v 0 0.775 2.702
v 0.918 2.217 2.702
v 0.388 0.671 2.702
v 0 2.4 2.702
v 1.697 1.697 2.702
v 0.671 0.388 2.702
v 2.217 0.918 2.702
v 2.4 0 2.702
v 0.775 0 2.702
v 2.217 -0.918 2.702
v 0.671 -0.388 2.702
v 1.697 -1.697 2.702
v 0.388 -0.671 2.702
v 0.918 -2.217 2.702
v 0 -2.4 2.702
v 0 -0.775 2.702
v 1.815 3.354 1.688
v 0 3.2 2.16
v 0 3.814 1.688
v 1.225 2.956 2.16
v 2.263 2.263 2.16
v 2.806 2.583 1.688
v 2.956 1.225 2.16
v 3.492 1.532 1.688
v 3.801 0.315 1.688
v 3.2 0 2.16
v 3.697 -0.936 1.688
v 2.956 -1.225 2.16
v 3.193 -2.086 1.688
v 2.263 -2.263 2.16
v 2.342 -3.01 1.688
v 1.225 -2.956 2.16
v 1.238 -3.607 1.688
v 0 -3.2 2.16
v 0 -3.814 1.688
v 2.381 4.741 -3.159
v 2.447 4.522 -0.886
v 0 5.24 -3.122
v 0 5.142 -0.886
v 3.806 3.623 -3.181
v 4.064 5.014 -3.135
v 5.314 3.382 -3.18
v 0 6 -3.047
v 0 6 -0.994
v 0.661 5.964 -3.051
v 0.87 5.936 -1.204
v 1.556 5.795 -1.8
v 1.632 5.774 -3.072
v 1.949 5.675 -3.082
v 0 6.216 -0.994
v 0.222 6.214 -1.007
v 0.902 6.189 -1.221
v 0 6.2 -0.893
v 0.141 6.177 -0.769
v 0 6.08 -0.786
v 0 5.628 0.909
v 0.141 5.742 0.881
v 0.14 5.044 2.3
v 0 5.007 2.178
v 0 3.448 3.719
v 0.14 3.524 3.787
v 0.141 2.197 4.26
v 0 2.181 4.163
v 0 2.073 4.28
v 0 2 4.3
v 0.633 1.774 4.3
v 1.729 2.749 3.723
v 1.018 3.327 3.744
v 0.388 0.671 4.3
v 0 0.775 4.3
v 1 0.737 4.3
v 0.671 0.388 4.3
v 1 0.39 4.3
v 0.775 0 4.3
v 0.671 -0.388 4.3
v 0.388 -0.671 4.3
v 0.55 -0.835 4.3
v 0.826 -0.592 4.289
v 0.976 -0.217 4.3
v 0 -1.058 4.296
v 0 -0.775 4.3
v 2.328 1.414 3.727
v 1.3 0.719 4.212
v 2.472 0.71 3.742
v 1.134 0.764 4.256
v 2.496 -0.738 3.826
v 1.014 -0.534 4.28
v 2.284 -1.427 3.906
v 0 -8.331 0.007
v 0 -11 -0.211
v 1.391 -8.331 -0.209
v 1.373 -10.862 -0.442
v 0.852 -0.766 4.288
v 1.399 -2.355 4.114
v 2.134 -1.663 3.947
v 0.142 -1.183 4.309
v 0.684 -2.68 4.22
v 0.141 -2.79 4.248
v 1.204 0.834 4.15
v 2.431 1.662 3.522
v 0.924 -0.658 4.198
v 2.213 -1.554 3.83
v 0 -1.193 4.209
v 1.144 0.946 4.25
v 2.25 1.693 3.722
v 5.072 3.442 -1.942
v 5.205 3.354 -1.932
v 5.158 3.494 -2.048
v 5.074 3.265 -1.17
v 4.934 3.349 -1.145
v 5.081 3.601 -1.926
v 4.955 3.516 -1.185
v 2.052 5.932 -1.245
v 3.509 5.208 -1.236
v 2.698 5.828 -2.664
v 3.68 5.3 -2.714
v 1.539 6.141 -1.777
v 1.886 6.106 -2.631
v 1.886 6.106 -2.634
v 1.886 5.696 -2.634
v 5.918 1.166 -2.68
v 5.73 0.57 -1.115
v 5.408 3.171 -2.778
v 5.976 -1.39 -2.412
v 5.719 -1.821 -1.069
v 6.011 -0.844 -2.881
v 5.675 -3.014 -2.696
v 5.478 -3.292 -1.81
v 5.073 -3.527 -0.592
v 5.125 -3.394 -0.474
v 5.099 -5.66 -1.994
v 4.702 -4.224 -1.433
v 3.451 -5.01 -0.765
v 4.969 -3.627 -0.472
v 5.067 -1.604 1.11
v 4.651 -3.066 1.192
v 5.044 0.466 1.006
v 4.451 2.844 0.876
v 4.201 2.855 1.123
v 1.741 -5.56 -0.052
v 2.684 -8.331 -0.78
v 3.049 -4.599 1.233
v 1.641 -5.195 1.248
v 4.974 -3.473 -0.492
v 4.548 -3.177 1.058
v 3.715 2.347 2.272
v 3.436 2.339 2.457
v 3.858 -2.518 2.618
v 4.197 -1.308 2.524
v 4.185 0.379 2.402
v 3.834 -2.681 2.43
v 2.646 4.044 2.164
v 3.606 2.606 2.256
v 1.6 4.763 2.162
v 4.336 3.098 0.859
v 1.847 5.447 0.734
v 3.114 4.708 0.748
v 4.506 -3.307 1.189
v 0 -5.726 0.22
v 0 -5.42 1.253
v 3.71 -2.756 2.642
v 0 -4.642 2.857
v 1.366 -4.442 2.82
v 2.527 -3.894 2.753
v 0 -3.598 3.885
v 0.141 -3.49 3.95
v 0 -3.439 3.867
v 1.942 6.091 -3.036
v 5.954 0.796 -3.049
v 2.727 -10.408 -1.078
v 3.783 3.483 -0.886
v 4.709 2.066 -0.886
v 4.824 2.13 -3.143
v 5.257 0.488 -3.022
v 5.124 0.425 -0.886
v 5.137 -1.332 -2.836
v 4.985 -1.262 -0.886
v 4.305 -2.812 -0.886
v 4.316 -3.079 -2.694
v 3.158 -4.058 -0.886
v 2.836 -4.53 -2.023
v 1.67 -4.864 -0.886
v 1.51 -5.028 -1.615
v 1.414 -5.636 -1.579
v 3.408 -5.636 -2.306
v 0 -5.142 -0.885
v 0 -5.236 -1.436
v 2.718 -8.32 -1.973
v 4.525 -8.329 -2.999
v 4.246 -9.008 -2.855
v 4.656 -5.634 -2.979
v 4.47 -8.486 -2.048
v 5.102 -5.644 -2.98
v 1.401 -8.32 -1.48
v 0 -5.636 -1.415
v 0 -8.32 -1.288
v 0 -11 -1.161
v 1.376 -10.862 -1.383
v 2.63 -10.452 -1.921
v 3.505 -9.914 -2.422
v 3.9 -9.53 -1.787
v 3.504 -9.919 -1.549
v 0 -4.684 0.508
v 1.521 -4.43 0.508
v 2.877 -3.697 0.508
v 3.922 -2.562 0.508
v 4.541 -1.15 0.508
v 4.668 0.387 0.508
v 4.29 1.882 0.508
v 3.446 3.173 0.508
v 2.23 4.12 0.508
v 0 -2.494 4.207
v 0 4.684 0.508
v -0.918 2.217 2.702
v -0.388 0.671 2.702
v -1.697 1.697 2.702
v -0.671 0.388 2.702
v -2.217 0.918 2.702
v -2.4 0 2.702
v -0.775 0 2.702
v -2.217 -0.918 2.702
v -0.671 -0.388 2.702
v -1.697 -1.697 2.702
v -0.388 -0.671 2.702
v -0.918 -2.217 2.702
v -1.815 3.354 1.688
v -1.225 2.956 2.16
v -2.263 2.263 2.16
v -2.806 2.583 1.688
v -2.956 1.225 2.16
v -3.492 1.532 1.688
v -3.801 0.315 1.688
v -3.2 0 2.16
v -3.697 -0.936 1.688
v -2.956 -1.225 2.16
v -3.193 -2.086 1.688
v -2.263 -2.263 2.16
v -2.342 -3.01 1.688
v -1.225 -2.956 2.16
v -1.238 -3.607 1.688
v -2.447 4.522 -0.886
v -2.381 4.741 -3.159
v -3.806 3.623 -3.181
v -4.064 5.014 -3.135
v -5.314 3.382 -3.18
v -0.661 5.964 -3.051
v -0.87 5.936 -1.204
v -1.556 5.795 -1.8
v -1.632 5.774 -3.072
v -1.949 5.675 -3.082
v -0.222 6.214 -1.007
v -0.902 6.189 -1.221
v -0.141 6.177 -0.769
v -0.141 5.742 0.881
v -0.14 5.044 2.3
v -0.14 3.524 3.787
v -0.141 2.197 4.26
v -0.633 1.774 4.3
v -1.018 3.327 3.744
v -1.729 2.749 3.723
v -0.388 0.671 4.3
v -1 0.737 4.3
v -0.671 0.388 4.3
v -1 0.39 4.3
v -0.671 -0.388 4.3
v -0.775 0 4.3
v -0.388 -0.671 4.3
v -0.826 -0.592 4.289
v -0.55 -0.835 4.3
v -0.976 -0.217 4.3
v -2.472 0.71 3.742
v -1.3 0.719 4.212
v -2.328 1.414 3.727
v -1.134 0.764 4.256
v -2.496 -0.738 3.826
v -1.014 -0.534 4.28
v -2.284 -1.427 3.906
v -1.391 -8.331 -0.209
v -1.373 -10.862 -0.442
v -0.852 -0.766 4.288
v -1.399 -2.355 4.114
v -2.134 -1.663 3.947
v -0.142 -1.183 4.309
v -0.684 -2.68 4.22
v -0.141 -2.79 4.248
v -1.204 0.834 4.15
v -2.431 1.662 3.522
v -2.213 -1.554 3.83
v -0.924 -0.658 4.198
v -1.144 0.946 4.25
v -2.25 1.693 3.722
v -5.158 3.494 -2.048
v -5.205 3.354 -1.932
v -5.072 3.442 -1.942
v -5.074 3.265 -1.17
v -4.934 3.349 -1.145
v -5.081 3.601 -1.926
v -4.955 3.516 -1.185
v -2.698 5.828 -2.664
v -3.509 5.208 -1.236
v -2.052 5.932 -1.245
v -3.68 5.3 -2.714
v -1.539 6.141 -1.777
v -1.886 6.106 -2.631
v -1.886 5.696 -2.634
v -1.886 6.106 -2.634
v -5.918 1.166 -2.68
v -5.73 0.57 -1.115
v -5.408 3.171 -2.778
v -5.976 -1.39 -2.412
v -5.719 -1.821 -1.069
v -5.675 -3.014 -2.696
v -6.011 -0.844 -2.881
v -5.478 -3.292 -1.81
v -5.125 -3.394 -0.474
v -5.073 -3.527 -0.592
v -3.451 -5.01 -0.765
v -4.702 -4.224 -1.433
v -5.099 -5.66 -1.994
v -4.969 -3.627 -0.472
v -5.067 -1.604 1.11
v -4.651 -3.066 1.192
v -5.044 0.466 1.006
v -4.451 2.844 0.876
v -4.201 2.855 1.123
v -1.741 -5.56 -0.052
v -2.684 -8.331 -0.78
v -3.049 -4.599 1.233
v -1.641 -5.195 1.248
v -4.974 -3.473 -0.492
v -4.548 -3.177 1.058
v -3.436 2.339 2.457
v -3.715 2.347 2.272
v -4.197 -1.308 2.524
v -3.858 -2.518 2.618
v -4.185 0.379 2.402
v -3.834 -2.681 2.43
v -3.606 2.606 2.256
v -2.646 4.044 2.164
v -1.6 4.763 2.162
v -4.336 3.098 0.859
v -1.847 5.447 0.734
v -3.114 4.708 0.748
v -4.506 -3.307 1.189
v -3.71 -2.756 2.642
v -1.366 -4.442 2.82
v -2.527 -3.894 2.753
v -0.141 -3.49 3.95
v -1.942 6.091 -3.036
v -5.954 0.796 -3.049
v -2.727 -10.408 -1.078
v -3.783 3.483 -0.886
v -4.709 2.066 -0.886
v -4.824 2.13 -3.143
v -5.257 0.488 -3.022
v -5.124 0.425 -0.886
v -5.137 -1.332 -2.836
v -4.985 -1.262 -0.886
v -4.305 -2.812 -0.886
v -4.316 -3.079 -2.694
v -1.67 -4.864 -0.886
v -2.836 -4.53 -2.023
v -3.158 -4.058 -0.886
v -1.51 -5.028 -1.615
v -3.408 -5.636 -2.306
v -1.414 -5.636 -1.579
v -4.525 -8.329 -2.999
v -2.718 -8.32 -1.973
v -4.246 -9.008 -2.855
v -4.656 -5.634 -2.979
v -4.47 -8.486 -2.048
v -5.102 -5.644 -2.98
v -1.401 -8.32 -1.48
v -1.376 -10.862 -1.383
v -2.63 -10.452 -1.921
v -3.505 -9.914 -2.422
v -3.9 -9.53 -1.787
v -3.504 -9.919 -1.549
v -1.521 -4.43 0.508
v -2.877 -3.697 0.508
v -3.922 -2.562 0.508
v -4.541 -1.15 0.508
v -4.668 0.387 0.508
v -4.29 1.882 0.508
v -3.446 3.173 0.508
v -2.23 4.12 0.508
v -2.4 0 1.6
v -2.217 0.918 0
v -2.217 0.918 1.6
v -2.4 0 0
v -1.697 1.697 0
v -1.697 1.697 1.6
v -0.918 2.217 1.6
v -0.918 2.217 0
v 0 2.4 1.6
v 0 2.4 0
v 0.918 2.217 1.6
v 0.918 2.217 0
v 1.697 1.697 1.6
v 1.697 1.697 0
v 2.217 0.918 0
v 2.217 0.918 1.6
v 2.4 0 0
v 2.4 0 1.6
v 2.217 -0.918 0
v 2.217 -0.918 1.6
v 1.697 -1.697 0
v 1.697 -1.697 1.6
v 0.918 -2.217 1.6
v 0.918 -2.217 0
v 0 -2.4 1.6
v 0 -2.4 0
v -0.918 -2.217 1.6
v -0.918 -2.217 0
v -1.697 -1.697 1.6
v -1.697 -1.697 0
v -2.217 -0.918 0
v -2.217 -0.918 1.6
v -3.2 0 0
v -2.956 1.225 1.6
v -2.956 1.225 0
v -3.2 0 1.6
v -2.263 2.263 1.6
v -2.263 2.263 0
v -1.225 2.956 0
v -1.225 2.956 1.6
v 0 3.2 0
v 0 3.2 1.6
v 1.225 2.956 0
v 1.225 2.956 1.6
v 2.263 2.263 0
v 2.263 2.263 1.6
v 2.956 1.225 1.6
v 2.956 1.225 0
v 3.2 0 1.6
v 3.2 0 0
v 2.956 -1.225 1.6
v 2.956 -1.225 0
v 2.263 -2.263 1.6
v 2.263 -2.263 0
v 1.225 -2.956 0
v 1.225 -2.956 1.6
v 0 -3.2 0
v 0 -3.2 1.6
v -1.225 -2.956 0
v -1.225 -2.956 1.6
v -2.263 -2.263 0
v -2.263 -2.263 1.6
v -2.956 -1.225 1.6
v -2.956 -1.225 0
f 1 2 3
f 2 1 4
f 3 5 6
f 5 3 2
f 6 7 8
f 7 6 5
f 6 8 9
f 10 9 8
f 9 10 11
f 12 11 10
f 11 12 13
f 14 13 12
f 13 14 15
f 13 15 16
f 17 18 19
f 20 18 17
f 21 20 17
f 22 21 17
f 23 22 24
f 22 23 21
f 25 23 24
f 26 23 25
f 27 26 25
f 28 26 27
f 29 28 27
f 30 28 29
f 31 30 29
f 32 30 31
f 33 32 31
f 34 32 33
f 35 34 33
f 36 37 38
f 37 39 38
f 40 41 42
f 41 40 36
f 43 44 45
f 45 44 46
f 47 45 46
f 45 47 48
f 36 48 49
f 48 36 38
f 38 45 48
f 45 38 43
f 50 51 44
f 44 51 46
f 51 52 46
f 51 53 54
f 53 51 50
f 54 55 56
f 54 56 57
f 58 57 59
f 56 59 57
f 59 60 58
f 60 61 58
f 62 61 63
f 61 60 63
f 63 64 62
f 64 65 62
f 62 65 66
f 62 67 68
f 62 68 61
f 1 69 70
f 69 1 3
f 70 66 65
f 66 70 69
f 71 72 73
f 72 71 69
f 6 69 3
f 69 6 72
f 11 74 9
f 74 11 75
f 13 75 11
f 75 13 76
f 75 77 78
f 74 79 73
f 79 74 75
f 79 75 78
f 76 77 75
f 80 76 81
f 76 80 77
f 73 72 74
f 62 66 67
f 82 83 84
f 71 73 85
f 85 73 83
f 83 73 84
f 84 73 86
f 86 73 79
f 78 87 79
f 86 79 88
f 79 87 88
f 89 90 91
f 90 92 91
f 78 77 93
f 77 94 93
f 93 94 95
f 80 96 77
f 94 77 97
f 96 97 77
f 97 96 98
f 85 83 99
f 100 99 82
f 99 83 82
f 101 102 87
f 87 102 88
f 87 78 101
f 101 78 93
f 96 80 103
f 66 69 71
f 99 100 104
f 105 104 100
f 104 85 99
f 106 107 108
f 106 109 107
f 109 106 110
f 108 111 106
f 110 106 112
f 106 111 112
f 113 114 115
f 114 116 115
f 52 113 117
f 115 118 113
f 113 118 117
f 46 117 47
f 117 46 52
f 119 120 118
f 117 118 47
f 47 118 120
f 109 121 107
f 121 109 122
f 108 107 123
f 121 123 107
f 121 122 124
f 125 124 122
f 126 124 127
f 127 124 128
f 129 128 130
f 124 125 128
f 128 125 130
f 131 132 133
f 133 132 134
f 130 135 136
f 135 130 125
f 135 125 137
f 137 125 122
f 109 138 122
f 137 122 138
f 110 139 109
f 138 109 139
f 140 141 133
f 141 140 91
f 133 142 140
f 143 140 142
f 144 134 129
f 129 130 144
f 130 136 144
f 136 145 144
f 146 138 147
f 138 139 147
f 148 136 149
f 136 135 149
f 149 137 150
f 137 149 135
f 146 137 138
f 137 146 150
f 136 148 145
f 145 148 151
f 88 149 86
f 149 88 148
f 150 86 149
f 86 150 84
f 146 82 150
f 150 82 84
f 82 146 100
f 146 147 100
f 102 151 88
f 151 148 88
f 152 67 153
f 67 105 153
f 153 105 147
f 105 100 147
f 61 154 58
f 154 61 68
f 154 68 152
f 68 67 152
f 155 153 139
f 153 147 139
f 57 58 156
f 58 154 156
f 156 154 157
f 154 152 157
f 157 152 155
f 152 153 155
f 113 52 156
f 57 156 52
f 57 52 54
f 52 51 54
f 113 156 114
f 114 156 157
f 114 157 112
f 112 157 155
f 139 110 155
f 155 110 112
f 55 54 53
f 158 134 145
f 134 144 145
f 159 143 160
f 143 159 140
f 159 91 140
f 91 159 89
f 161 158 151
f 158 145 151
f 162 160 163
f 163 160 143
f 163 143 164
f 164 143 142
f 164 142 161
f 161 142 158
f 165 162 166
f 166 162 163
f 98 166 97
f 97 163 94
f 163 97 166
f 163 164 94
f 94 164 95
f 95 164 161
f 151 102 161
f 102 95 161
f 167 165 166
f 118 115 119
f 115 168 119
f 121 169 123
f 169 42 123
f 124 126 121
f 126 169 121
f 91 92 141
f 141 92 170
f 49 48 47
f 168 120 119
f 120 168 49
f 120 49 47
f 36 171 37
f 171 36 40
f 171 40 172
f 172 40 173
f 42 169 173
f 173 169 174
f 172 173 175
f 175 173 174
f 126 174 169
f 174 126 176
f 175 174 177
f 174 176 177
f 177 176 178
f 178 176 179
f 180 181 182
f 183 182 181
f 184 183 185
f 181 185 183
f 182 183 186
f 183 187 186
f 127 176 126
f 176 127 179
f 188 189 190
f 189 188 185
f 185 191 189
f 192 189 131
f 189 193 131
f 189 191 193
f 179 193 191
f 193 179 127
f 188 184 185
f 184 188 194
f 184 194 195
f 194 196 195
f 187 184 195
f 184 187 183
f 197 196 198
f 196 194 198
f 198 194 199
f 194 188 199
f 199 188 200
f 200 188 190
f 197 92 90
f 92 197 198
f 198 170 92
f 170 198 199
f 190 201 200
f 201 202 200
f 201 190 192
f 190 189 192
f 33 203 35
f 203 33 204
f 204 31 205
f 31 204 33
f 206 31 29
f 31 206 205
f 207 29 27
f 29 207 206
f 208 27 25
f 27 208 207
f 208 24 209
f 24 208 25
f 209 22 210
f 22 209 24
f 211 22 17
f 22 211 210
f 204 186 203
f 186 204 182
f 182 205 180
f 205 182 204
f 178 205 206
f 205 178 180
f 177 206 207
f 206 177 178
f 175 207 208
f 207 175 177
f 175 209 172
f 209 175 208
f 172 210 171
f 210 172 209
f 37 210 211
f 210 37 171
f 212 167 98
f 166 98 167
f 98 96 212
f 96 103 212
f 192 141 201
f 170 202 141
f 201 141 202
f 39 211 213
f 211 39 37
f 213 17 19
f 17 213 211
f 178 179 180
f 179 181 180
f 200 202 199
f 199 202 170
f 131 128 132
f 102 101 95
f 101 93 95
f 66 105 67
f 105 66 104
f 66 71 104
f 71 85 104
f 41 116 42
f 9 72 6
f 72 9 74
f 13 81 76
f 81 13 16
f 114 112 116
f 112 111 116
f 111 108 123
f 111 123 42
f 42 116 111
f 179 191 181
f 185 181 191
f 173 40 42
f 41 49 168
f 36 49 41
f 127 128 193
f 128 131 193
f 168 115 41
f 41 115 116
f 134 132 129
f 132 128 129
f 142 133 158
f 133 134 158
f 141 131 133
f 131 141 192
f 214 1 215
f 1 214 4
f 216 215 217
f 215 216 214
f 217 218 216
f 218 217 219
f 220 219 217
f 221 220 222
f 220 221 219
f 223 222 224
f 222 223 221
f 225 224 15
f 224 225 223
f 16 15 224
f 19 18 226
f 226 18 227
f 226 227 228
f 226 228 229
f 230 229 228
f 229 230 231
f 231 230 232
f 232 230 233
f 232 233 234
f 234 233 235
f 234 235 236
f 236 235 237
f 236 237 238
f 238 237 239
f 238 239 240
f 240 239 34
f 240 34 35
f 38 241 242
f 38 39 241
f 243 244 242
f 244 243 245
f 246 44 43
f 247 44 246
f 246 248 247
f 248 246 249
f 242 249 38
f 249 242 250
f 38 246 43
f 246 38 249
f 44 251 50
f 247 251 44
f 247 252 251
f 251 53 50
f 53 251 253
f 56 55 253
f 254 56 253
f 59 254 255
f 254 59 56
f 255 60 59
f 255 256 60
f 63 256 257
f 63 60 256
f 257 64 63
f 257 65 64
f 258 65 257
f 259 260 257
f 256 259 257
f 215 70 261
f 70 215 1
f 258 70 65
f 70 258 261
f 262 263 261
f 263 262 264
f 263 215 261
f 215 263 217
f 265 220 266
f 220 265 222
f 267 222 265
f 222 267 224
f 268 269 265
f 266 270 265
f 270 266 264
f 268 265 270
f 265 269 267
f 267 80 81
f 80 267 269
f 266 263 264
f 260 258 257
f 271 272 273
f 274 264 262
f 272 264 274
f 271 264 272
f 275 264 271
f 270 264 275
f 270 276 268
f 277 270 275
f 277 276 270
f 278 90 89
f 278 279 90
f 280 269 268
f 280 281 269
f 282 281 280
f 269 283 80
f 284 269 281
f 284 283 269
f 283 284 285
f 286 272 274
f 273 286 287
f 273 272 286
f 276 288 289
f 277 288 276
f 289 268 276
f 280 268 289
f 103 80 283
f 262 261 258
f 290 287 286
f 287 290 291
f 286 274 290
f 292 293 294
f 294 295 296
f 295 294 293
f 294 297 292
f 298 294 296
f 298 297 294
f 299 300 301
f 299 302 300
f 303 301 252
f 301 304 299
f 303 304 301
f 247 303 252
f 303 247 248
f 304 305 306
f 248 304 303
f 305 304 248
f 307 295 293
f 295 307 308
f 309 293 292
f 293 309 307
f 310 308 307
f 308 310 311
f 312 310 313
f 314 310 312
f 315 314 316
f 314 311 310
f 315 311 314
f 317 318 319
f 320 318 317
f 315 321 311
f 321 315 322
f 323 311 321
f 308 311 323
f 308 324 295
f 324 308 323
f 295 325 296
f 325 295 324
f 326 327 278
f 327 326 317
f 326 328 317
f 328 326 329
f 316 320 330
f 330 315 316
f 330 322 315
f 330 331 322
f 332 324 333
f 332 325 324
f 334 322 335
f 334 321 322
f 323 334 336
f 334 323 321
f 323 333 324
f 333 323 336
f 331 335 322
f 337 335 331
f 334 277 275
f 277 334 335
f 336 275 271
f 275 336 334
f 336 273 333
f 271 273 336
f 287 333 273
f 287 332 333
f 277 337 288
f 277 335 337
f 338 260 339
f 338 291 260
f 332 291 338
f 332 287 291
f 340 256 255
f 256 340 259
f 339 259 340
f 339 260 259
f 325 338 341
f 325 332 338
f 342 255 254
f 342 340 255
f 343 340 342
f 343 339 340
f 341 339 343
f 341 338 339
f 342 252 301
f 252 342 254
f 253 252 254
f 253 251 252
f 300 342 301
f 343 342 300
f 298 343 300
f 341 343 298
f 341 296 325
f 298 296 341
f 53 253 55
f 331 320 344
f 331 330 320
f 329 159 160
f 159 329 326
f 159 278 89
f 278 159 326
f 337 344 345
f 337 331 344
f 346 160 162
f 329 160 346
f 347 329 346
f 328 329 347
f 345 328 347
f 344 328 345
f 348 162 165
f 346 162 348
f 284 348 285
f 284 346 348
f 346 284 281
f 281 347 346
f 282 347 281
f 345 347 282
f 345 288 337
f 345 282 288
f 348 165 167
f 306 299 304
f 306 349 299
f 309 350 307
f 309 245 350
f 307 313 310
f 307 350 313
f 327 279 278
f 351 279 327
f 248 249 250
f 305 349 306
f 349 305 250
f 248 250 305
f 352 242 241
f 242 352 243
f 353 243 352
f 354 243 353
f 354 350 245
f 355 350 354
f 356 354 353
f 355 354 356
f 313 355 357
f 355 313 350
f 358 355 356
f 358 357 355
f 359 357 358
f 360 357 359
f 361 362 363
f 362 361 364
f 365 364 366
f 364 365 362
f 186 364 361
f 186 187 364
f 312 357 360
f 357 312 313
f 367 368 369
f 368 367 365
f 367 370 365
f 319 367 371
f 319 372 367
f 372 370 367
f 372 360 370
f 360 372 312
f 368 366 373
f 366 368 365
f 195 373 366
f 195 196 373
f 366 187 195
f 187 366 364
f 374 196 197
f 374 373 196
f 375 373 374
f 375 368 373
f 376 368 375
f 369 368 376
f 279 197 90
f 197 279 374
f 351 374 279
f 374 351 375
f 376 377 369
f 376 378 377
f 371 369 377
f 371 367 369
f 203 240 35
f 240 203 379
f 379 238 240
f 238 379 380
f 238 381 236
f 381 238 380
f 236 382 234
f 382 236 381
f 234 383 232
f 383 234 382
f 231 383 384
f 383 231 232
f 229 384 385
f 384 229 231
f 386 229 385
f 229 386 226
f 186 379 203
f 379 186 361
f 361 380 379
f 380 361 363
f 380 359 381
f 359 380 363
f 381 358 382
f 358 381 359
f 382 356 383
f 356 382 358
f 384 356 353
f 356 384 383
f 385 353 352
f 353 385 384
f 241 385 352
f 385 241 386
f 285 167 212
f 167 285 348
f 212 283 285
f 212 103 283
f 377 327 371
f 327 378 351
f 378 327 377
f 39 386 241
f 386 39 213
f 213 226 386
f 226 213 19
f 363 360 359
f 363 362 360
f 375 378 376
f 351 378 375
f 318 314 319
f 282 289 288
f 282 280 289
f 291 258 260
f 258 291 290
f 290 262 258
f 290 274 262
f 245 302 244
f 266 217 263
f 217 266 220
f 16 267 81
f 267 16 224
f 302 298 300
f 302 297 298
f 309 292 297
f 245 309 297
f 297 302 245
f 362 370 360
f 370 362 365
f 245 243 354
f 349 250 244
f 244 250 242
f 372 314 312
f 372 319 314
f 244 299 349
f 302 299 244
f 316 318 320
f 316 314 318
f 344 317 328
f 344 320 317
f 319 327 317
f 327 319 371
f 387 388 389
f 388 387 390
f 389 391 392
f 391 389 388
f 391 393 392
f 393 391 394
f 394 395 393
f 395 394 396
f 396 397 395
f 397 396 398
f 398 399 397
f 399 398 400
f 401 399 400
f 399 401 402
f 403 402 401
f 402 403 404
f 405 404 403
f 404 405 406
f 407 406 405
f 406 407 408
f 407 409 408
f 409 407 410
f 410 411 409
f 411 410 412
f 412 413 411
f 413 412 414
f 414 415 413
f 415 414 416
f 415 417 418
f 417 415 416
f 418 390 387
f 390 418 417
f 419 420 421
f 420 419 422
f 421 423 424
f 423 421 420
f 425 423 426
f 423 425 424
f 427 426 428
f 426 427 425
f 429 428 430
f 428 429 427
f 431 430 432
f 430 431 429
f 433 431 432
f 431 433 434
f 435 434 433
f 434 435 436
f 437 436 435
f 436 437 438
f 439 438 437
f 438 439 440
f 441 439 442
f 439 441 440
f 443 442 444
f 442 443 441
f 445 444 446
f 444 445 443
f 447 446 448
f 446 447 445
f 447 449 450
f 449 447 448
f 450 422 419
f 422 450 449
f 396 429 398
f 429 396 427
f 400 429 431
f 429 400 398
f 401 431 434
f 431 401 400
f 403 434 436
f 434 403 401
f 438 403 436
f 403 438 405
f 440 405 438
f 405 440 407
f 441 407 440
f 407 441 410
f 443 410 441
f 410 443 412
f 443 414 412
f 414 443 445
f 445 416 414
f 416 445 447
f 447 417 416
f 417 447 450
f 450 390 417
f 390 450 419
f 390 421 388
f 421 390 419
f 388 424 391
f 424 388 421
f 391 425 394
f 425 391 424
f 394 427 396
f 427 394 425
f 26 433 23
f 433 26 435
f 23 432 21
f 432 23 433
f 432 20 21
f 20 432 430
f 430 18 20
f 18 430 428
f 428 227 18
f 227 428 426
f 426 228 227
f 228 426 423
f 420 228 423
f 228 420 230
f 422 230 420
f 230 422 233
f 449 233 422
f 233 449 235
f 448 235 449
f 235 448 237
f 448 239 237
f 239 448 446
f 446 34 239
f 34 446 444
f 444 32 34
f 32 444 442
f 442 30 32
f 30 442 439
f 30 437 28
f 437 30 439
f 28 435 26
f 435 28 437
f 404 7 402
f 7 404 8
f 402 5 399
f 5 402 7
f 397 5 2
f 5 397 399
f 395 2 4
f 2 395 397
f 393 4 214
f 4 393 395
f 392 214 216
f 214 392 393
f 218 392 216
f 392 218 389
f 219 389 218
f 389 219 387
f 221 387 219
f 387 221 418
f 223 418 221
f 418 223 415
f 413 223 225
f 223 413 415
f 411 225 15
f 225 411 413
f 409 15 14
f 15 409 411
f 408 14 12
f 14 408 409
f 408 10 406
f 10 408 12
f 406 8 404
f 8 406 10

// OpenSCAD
use <../lib.scad>
use <../p/4-4cyli.scad>
use <../p/4-4edge.scad>
use <s/11303s01.scad>
use <../p/stud4a.scad>
$fa=1; $fs=0.2;
function ldraw_lib__11303(realsolid=false) = [
// 0 Minifig Cap with Short Arched Peak with Seams and Top Pin Hole
// 0 Name: 11303.dat
// 0 Author: Philippe Hurbain [Philo]
// 0 !LDRAW_ORG Part UPDATE 2014-02
// 0 !LICENSE Licensed under CC BY 2.0 and CC BY 4.0 : see CAreadme.txt
// 
// 0 !HELP Top accessory position: Y = -11
// 
// 0 BFC CERTIFY CCW
  [0,"BFC","CERTIFY"],
  [0,"BFC","CCW"],
// 
// 0 !CATEGORY Minifig Headwear
// 
// 0 !HISTORY 2013-08-14 {LEGO Digital Designer} Original part shape
// 0 !HISTORY 2014-09-23 [Philo] File preparation for LDraw Parts Tracker
// 0 !HISTORY 2014-12-23 [PTadmin] Official Update 2014-02
// 
// 
// 1 16 0 0 0 1 0 0 0 1 0 0 0 1 s\11303s01.dat
  [1,16,0,0,0,1,0,0,0,1,0,0,0,1, ldraw_lib__s__11303s01(realsolid)],
// 1 16 0 0 0 -1 0 0 0 1 0 0 0 1 s\11303s01.dat
  [1,16,0,0,0,-1,0,0,0,1,0,0,0,1, ldraw_lib__s__11303s01(realsolid)],
// 1 16 0 -4 0 -1 0 0 0 -1 0 0 0 1 stud4a.dat
  [1,16,0,-4,0,-1,0,0,0,-1,0,0,0,1, ldraw_lib__stud4a(realsolid)],
// 1 16 0 -4 0 8 0 0 0 -1.4 0 0 0 8 4-4cyli.dat
  [1,16,0,-4,0,8,0,0,0,-1.4,0,0,0,8, ldraw_lib__4_4cyli(realsolid)],
// 0 BFC INVERTNEXT
  [0,"BFC","INVERTNEXT"],
// 1 16 0 -4 0 6 0 0 0 -2.756 0 0 0 6 4-4cyli.dat
  [1,16,0,-4,0,6,0,0,0,-2.756,0,0,0,6, ldraw_lib__4_4cyli(realsolid)],
// 1 16 0 -5.4 0 8 0 0 0 1 0 0 0 8 4-4edge.dat
  [1,16,0,-5.4,0,8,0,0,0,1,0,0,0,8, ldraw_lib__4_4edge(realsolid)],
// 1 16 0 -6.756 0 6 0 0 0 1 0 0 0 6 4-4edge.dat
  [1,16,0,-6.756,0,6,0,0,0,1,0,0,0,6, ldraw_lib__4_4edge(realsolid)],
// 5 24 0 -5.4 8 0 -4.219 9.534 4.538 -4.219 8.385 -4.538 -4.219 8.385
  [5,24,0,-5.4,8,0,-4.219,9.534,4.538,-4.219,8.385,-4.538,-4.219,8.385],
// 5 24 0 -4.219 -9.534 0 -5.4 -8 3.096 -4.219 -9.018 -3.096 -4.219 -9.018
  [5,24,0,-4.219,-9.534,0,-5.4,-8,3.096,-4.219,-9.018,-3.096,-4.219,-9.018],
// 5 24 0 2.214 12.855 0 7.806 13.1 6.118 2.214 11.306 -6.118 2.214 11.306
  [5,24,0,2.214,12.855,0,7.806,13.1,6.118,2.214,11.306,-6.118,2.214,11.306],
// 5 24 0 7.617 15 0 2.485 15 1.652 7.628 14.909 -1.652 7.628 14.909
  [5,24,0,7.617,15,0,2.485,15,1.652,7.628,14.909,-1.652,7.628,14.909],
// 5 24 0 7.806 13.1 0 7.617 15 1.652 7.628 14.909 -4.079 7.679 14.435
  [5,24,0,7.806,13.1,0,7.617,15,1.652,7.628,14.909,-4.079,7.679,14.435],
// 5 24 0 2.485 15 0 2.485 15.539 0.555 2.518 15.535 -0.555 2.518 15.535
  [5,24,0,2.485,15,0,2.485,15.539,0.555,2.518,15.535,-0.555,2.518,15.535],
// 5 24 0 2.485 15.539 0 2.232 15.499 0.555 2.518 15.535 -0.555 2.518 15.535
  [5,24,0,2.485,15.539,0,2.232,15.499,0.555,2.518,15.535,-0.555,2.518,15.535],
// 5 24 0 1.964 15.2 0 -2.272 14.07 0.352 1.922 15.442 -0.352 1.922 15.442
  [5,24,0,1.964,15.2,0,-2.272,14.07,0.352,1.922,15.442,-0.352,1.922,15.442],
// 5 24 0 -2.272 14.07 0 -5.446 12.517 0.352 -2.203 14.356 -0.352 -2.203 14.356
  [5,24,0,-2.272,14.07,0,-5.446,12.517,0.352,-2.203,14.356,-0.352,-2.203,14.356],
// 5 24 0 -5.446 12.517 0 -9.297 8.62 0.351 -5.75 12.61 -0.351 -5.75 12.61
  [5,24,0,-5.446,12.517,0,-9.297,8.62,0.351,-5.75,12.61,-0.351,-5.75,12.61],
// 5 24 0 -9.297 8.62 0 -10.407 5.453 0.351 -9.468 8.81 -0.351 -9.468 8.81
  [5,24,0,-9.297,8.62,0,-10.407,5.453,0.351,-9.468,8.81,-0.351,-9.468,8.81],
// 5 24 0 -10.407 5.453 0 -10.7 5.182 0.352 -10.65 5.492 -0.352 -10.65 5.492
  [5,24,0,-10.407,5.453,0,-10.7,5.182,0.352,-10.65,5.492,-0.352,-10.65,5.492],
// 5 24 0 -10.7 5.182 0 -10.75 5 0.352 -10.65 5.492 -0.352 -10.65 5.492
  [5,24,0,-10.7,5.182,0,-10.75,5,0.352,-10.65,5.492,-0.352,-10.65,5.492],
// 5 24 0 -10.75 1.938 0 -6.756 1.938 0.969 -6.756 1.678 -0.969 -10.75 1.678
  [5,24,0,-10.75,1.938,0,-6.756,1.938,0.969,-6.756,1.678,-0.969,-10.75,1.678],
// 5 24 0 -10.75 -1.938 0 -10.739 -2.644 1.375 -10.75 -2.088 -0.969 -10.75 -1.678
  [5,24,0,-10.75,-1.938,0,-10.739,-2.644,1.375,-10.75,-2.088,-0.969,-10.75,-1.678],
// 5 24 0 -0.018 -20.827 0 0.527 -27.5 3.477 0.522 -20.827 -3.477 0.522 -20.827
  [5,24,0,-0.018,-20.827,0,0.527,-27.5,3.477,0.522,-20.827,-3.477,0.522,-20.827],
// 5 24 0 -10.739 -2.644 0 -10.523 -2.983 0.354 -10.772 -2.958 -0.354 -10.772 -2.958
  [5,24,0,-10.739,-2.644,0,-10.523,-2.983,0.354,-10.772,-2.958,-0.354,-10.772,-2.958],
// 5 24 0 2.232 15.499 0 1.964 15.2 0.352 1.922 15.442 -0.352 1.922 15.442
  [5,24,0,2.232,15.499,0,1.964,15.2,0.352,1.922,15.442,-0.352,1.922,15.442],
// 5 24 0 -3.132 -13.55 0 -0.55 -14.314 4.352 0.129 -13.899 -4.102 -3.121 -12.988
  [5,24,0,-3.132,-13.55,0,-0.55,-14.314,4.352,0.129,-13.899,-4.102,-3.121,-12.988],
// 5 24 0 -0.55 -14.314 0 -0.018 -20.827 3.477 0.522 -20.827 -4.352 0.129 -13.899
  [5,24,0,-0.55,-14.314,0,-0.018,-20.827,3.477,0.522,-20.827,-4.352,0.129,-13.899],
// 5 24 0 -7.142 -11.605 0 -3.132 -13.55 3.415 -7.049 -11.104 -3.415 -7.049 -11.104
  [5,24,0,-7.142,-11.605,0,-3.132,-13.55,3.415,-7.049,-11.104,-3.415,-7.049,-11.104],
// 5 24 0 -9.712 -8.994 0 -7.142 -11.605 0.352 -9.876 -8.726 -0.352 -9.876 -8.726
  [5,24,0,-9.712,-8.994,0,-7.142,-11.605,0.352,-9.876,-8.726,-0.352,-9.876,-8.726],
// 5 24 0 -9.668 -8.597 0 -9.712 -8.994 0.352 -9.876 -8.726 -0.352 -9.876 -8.726
  [5,24,0,-9.668,-8.597,0,-9.712,-8.994,0.352,-9.876,-8.726,-0.352,-9.876,-8.726],
// 5 24 0 3.59 -13.091 0 2.212 -12.855 3.774 4.038 -12.57 -3.774 4.038 -12.57
  [5,24,0,3.59,-13.091,0,2.212,-12.855,3.774,4.038,-12.57,-3.774,4.038,-12.57],
// 5 24 0 3.22 -20.799 0 3.538 -14.091 3.503 3.699 -20.799 -3.503 3.699 -20.799
  [5,24,0,3.22,-20.799,0,3.538,-14.091,3.503,3.699,-20.799,-3.503,3.699,-20.799],
// 5 24 0 3.538 -14.091 0 3.59 -13.091 3.774 4.038 -12.57 -3.536 3.948 -14.091
  [5,24,0,3.538,-14.091,0,3.59,-13.091,3.774,4.038,-12.57,-3.536,3.948,-14.091],
// 5 24 0 2.902 -27.5 0 3.22 -20.799 3.441 3.458 -27.154 -3.441 3.458 -27.154
  [5,24,0,2.902,-27.5,0,3.22,-20.799,3.441,3.458,-27.154,-3.441,3.458,-27.154],
// 5 24 0 0.527 -27.5 0 2.902 -27.5 3.433 1.105 -27.155 -3.433 1.105 -27.155
  [5,24,0,0.527,-27.5,0,2.902,-27.5,3.433,1.105,-27.155,-3.433,1.105,-27.155],
// 5 24 0 -1.27 -11.711 0 -4.219 -9.534 3.803 -1.269 -11.076 -3.803 -1.269 -11.076
  [5,24,0,-1.27,-11.711,0,-4.219,-9.534,3.803,-1.269,-11.076,-3.803,-1.269,-11.076],
// 5 24 0 2.212 -12.855 0 -1.27 -11.711 3.803 -1.269 -11.076 -4.174 2.214 -12.159
  [5,24,0,2.212,-12.855,0,-1.27,-11.711,3.803,-1.269,-11.076,-4.174,2.214,-12.159],
// 5 24 0 -10.518 -6.236 0 -9.668 -8.597 0.352 -10.619 -6.975 -0.352 -10.619 -6.975
  [5,24,0,-10.518,-6.236,0,-9.668,-8.597,0.352,-10.619,-6.975,-0.352,-10.619,-6.975],
// 5 24 0 -10.523 -2.983 0 -10.518 -6.236 0.354 -10.772 -2.958 -0.354 -10.772 -2.958
  [5,24,0,-10.523,-2.983,0,-10.518,-6.236,0.354,-10.772,-2.958,-0.354,-10.772,-2.958],
// 5 24 0 -1.269 11.711 0 2.214 12.855 5.574 -1.269 10.299 -5.574 -1.269 10.299
  [5,24,0,-1.269,11.711,0,2.214,12.855,5.574,-1.269,10.299,-5.574,-1.269,10.299],
// 5 24 0 -4.219 9.534 0 -1.269 11.711 4.538 -4.219 8.385 -4.538 -4.219 8.385
  [5,24,0,-4.219,9.534,0,-1.269,11.711,4.538,-4.219,8.385,-4.538,-4.219,8.385],
// 5 24 0 -6.756 -1.938 0 -10.75 -1.938 0.969 -10.75 -1.678 -0.969 -6.756 -1.678
  [5,24,0,-6.756,-1.938,0,-10.75,-1.938,0.969,-10.75,-1.678,-0.969,-6.756,-1.678],
];
module ldraw_lib__11303(step=0, col=false, unit=2/5, alt=false, line=0.2, solid=!$preview)
    makepoly(ldraw_lib__11303(solid), step=step, col=col, unit=unit, alt=alt, line=line, solid=solid);
ldraw_lib__11303(line=0.2);
